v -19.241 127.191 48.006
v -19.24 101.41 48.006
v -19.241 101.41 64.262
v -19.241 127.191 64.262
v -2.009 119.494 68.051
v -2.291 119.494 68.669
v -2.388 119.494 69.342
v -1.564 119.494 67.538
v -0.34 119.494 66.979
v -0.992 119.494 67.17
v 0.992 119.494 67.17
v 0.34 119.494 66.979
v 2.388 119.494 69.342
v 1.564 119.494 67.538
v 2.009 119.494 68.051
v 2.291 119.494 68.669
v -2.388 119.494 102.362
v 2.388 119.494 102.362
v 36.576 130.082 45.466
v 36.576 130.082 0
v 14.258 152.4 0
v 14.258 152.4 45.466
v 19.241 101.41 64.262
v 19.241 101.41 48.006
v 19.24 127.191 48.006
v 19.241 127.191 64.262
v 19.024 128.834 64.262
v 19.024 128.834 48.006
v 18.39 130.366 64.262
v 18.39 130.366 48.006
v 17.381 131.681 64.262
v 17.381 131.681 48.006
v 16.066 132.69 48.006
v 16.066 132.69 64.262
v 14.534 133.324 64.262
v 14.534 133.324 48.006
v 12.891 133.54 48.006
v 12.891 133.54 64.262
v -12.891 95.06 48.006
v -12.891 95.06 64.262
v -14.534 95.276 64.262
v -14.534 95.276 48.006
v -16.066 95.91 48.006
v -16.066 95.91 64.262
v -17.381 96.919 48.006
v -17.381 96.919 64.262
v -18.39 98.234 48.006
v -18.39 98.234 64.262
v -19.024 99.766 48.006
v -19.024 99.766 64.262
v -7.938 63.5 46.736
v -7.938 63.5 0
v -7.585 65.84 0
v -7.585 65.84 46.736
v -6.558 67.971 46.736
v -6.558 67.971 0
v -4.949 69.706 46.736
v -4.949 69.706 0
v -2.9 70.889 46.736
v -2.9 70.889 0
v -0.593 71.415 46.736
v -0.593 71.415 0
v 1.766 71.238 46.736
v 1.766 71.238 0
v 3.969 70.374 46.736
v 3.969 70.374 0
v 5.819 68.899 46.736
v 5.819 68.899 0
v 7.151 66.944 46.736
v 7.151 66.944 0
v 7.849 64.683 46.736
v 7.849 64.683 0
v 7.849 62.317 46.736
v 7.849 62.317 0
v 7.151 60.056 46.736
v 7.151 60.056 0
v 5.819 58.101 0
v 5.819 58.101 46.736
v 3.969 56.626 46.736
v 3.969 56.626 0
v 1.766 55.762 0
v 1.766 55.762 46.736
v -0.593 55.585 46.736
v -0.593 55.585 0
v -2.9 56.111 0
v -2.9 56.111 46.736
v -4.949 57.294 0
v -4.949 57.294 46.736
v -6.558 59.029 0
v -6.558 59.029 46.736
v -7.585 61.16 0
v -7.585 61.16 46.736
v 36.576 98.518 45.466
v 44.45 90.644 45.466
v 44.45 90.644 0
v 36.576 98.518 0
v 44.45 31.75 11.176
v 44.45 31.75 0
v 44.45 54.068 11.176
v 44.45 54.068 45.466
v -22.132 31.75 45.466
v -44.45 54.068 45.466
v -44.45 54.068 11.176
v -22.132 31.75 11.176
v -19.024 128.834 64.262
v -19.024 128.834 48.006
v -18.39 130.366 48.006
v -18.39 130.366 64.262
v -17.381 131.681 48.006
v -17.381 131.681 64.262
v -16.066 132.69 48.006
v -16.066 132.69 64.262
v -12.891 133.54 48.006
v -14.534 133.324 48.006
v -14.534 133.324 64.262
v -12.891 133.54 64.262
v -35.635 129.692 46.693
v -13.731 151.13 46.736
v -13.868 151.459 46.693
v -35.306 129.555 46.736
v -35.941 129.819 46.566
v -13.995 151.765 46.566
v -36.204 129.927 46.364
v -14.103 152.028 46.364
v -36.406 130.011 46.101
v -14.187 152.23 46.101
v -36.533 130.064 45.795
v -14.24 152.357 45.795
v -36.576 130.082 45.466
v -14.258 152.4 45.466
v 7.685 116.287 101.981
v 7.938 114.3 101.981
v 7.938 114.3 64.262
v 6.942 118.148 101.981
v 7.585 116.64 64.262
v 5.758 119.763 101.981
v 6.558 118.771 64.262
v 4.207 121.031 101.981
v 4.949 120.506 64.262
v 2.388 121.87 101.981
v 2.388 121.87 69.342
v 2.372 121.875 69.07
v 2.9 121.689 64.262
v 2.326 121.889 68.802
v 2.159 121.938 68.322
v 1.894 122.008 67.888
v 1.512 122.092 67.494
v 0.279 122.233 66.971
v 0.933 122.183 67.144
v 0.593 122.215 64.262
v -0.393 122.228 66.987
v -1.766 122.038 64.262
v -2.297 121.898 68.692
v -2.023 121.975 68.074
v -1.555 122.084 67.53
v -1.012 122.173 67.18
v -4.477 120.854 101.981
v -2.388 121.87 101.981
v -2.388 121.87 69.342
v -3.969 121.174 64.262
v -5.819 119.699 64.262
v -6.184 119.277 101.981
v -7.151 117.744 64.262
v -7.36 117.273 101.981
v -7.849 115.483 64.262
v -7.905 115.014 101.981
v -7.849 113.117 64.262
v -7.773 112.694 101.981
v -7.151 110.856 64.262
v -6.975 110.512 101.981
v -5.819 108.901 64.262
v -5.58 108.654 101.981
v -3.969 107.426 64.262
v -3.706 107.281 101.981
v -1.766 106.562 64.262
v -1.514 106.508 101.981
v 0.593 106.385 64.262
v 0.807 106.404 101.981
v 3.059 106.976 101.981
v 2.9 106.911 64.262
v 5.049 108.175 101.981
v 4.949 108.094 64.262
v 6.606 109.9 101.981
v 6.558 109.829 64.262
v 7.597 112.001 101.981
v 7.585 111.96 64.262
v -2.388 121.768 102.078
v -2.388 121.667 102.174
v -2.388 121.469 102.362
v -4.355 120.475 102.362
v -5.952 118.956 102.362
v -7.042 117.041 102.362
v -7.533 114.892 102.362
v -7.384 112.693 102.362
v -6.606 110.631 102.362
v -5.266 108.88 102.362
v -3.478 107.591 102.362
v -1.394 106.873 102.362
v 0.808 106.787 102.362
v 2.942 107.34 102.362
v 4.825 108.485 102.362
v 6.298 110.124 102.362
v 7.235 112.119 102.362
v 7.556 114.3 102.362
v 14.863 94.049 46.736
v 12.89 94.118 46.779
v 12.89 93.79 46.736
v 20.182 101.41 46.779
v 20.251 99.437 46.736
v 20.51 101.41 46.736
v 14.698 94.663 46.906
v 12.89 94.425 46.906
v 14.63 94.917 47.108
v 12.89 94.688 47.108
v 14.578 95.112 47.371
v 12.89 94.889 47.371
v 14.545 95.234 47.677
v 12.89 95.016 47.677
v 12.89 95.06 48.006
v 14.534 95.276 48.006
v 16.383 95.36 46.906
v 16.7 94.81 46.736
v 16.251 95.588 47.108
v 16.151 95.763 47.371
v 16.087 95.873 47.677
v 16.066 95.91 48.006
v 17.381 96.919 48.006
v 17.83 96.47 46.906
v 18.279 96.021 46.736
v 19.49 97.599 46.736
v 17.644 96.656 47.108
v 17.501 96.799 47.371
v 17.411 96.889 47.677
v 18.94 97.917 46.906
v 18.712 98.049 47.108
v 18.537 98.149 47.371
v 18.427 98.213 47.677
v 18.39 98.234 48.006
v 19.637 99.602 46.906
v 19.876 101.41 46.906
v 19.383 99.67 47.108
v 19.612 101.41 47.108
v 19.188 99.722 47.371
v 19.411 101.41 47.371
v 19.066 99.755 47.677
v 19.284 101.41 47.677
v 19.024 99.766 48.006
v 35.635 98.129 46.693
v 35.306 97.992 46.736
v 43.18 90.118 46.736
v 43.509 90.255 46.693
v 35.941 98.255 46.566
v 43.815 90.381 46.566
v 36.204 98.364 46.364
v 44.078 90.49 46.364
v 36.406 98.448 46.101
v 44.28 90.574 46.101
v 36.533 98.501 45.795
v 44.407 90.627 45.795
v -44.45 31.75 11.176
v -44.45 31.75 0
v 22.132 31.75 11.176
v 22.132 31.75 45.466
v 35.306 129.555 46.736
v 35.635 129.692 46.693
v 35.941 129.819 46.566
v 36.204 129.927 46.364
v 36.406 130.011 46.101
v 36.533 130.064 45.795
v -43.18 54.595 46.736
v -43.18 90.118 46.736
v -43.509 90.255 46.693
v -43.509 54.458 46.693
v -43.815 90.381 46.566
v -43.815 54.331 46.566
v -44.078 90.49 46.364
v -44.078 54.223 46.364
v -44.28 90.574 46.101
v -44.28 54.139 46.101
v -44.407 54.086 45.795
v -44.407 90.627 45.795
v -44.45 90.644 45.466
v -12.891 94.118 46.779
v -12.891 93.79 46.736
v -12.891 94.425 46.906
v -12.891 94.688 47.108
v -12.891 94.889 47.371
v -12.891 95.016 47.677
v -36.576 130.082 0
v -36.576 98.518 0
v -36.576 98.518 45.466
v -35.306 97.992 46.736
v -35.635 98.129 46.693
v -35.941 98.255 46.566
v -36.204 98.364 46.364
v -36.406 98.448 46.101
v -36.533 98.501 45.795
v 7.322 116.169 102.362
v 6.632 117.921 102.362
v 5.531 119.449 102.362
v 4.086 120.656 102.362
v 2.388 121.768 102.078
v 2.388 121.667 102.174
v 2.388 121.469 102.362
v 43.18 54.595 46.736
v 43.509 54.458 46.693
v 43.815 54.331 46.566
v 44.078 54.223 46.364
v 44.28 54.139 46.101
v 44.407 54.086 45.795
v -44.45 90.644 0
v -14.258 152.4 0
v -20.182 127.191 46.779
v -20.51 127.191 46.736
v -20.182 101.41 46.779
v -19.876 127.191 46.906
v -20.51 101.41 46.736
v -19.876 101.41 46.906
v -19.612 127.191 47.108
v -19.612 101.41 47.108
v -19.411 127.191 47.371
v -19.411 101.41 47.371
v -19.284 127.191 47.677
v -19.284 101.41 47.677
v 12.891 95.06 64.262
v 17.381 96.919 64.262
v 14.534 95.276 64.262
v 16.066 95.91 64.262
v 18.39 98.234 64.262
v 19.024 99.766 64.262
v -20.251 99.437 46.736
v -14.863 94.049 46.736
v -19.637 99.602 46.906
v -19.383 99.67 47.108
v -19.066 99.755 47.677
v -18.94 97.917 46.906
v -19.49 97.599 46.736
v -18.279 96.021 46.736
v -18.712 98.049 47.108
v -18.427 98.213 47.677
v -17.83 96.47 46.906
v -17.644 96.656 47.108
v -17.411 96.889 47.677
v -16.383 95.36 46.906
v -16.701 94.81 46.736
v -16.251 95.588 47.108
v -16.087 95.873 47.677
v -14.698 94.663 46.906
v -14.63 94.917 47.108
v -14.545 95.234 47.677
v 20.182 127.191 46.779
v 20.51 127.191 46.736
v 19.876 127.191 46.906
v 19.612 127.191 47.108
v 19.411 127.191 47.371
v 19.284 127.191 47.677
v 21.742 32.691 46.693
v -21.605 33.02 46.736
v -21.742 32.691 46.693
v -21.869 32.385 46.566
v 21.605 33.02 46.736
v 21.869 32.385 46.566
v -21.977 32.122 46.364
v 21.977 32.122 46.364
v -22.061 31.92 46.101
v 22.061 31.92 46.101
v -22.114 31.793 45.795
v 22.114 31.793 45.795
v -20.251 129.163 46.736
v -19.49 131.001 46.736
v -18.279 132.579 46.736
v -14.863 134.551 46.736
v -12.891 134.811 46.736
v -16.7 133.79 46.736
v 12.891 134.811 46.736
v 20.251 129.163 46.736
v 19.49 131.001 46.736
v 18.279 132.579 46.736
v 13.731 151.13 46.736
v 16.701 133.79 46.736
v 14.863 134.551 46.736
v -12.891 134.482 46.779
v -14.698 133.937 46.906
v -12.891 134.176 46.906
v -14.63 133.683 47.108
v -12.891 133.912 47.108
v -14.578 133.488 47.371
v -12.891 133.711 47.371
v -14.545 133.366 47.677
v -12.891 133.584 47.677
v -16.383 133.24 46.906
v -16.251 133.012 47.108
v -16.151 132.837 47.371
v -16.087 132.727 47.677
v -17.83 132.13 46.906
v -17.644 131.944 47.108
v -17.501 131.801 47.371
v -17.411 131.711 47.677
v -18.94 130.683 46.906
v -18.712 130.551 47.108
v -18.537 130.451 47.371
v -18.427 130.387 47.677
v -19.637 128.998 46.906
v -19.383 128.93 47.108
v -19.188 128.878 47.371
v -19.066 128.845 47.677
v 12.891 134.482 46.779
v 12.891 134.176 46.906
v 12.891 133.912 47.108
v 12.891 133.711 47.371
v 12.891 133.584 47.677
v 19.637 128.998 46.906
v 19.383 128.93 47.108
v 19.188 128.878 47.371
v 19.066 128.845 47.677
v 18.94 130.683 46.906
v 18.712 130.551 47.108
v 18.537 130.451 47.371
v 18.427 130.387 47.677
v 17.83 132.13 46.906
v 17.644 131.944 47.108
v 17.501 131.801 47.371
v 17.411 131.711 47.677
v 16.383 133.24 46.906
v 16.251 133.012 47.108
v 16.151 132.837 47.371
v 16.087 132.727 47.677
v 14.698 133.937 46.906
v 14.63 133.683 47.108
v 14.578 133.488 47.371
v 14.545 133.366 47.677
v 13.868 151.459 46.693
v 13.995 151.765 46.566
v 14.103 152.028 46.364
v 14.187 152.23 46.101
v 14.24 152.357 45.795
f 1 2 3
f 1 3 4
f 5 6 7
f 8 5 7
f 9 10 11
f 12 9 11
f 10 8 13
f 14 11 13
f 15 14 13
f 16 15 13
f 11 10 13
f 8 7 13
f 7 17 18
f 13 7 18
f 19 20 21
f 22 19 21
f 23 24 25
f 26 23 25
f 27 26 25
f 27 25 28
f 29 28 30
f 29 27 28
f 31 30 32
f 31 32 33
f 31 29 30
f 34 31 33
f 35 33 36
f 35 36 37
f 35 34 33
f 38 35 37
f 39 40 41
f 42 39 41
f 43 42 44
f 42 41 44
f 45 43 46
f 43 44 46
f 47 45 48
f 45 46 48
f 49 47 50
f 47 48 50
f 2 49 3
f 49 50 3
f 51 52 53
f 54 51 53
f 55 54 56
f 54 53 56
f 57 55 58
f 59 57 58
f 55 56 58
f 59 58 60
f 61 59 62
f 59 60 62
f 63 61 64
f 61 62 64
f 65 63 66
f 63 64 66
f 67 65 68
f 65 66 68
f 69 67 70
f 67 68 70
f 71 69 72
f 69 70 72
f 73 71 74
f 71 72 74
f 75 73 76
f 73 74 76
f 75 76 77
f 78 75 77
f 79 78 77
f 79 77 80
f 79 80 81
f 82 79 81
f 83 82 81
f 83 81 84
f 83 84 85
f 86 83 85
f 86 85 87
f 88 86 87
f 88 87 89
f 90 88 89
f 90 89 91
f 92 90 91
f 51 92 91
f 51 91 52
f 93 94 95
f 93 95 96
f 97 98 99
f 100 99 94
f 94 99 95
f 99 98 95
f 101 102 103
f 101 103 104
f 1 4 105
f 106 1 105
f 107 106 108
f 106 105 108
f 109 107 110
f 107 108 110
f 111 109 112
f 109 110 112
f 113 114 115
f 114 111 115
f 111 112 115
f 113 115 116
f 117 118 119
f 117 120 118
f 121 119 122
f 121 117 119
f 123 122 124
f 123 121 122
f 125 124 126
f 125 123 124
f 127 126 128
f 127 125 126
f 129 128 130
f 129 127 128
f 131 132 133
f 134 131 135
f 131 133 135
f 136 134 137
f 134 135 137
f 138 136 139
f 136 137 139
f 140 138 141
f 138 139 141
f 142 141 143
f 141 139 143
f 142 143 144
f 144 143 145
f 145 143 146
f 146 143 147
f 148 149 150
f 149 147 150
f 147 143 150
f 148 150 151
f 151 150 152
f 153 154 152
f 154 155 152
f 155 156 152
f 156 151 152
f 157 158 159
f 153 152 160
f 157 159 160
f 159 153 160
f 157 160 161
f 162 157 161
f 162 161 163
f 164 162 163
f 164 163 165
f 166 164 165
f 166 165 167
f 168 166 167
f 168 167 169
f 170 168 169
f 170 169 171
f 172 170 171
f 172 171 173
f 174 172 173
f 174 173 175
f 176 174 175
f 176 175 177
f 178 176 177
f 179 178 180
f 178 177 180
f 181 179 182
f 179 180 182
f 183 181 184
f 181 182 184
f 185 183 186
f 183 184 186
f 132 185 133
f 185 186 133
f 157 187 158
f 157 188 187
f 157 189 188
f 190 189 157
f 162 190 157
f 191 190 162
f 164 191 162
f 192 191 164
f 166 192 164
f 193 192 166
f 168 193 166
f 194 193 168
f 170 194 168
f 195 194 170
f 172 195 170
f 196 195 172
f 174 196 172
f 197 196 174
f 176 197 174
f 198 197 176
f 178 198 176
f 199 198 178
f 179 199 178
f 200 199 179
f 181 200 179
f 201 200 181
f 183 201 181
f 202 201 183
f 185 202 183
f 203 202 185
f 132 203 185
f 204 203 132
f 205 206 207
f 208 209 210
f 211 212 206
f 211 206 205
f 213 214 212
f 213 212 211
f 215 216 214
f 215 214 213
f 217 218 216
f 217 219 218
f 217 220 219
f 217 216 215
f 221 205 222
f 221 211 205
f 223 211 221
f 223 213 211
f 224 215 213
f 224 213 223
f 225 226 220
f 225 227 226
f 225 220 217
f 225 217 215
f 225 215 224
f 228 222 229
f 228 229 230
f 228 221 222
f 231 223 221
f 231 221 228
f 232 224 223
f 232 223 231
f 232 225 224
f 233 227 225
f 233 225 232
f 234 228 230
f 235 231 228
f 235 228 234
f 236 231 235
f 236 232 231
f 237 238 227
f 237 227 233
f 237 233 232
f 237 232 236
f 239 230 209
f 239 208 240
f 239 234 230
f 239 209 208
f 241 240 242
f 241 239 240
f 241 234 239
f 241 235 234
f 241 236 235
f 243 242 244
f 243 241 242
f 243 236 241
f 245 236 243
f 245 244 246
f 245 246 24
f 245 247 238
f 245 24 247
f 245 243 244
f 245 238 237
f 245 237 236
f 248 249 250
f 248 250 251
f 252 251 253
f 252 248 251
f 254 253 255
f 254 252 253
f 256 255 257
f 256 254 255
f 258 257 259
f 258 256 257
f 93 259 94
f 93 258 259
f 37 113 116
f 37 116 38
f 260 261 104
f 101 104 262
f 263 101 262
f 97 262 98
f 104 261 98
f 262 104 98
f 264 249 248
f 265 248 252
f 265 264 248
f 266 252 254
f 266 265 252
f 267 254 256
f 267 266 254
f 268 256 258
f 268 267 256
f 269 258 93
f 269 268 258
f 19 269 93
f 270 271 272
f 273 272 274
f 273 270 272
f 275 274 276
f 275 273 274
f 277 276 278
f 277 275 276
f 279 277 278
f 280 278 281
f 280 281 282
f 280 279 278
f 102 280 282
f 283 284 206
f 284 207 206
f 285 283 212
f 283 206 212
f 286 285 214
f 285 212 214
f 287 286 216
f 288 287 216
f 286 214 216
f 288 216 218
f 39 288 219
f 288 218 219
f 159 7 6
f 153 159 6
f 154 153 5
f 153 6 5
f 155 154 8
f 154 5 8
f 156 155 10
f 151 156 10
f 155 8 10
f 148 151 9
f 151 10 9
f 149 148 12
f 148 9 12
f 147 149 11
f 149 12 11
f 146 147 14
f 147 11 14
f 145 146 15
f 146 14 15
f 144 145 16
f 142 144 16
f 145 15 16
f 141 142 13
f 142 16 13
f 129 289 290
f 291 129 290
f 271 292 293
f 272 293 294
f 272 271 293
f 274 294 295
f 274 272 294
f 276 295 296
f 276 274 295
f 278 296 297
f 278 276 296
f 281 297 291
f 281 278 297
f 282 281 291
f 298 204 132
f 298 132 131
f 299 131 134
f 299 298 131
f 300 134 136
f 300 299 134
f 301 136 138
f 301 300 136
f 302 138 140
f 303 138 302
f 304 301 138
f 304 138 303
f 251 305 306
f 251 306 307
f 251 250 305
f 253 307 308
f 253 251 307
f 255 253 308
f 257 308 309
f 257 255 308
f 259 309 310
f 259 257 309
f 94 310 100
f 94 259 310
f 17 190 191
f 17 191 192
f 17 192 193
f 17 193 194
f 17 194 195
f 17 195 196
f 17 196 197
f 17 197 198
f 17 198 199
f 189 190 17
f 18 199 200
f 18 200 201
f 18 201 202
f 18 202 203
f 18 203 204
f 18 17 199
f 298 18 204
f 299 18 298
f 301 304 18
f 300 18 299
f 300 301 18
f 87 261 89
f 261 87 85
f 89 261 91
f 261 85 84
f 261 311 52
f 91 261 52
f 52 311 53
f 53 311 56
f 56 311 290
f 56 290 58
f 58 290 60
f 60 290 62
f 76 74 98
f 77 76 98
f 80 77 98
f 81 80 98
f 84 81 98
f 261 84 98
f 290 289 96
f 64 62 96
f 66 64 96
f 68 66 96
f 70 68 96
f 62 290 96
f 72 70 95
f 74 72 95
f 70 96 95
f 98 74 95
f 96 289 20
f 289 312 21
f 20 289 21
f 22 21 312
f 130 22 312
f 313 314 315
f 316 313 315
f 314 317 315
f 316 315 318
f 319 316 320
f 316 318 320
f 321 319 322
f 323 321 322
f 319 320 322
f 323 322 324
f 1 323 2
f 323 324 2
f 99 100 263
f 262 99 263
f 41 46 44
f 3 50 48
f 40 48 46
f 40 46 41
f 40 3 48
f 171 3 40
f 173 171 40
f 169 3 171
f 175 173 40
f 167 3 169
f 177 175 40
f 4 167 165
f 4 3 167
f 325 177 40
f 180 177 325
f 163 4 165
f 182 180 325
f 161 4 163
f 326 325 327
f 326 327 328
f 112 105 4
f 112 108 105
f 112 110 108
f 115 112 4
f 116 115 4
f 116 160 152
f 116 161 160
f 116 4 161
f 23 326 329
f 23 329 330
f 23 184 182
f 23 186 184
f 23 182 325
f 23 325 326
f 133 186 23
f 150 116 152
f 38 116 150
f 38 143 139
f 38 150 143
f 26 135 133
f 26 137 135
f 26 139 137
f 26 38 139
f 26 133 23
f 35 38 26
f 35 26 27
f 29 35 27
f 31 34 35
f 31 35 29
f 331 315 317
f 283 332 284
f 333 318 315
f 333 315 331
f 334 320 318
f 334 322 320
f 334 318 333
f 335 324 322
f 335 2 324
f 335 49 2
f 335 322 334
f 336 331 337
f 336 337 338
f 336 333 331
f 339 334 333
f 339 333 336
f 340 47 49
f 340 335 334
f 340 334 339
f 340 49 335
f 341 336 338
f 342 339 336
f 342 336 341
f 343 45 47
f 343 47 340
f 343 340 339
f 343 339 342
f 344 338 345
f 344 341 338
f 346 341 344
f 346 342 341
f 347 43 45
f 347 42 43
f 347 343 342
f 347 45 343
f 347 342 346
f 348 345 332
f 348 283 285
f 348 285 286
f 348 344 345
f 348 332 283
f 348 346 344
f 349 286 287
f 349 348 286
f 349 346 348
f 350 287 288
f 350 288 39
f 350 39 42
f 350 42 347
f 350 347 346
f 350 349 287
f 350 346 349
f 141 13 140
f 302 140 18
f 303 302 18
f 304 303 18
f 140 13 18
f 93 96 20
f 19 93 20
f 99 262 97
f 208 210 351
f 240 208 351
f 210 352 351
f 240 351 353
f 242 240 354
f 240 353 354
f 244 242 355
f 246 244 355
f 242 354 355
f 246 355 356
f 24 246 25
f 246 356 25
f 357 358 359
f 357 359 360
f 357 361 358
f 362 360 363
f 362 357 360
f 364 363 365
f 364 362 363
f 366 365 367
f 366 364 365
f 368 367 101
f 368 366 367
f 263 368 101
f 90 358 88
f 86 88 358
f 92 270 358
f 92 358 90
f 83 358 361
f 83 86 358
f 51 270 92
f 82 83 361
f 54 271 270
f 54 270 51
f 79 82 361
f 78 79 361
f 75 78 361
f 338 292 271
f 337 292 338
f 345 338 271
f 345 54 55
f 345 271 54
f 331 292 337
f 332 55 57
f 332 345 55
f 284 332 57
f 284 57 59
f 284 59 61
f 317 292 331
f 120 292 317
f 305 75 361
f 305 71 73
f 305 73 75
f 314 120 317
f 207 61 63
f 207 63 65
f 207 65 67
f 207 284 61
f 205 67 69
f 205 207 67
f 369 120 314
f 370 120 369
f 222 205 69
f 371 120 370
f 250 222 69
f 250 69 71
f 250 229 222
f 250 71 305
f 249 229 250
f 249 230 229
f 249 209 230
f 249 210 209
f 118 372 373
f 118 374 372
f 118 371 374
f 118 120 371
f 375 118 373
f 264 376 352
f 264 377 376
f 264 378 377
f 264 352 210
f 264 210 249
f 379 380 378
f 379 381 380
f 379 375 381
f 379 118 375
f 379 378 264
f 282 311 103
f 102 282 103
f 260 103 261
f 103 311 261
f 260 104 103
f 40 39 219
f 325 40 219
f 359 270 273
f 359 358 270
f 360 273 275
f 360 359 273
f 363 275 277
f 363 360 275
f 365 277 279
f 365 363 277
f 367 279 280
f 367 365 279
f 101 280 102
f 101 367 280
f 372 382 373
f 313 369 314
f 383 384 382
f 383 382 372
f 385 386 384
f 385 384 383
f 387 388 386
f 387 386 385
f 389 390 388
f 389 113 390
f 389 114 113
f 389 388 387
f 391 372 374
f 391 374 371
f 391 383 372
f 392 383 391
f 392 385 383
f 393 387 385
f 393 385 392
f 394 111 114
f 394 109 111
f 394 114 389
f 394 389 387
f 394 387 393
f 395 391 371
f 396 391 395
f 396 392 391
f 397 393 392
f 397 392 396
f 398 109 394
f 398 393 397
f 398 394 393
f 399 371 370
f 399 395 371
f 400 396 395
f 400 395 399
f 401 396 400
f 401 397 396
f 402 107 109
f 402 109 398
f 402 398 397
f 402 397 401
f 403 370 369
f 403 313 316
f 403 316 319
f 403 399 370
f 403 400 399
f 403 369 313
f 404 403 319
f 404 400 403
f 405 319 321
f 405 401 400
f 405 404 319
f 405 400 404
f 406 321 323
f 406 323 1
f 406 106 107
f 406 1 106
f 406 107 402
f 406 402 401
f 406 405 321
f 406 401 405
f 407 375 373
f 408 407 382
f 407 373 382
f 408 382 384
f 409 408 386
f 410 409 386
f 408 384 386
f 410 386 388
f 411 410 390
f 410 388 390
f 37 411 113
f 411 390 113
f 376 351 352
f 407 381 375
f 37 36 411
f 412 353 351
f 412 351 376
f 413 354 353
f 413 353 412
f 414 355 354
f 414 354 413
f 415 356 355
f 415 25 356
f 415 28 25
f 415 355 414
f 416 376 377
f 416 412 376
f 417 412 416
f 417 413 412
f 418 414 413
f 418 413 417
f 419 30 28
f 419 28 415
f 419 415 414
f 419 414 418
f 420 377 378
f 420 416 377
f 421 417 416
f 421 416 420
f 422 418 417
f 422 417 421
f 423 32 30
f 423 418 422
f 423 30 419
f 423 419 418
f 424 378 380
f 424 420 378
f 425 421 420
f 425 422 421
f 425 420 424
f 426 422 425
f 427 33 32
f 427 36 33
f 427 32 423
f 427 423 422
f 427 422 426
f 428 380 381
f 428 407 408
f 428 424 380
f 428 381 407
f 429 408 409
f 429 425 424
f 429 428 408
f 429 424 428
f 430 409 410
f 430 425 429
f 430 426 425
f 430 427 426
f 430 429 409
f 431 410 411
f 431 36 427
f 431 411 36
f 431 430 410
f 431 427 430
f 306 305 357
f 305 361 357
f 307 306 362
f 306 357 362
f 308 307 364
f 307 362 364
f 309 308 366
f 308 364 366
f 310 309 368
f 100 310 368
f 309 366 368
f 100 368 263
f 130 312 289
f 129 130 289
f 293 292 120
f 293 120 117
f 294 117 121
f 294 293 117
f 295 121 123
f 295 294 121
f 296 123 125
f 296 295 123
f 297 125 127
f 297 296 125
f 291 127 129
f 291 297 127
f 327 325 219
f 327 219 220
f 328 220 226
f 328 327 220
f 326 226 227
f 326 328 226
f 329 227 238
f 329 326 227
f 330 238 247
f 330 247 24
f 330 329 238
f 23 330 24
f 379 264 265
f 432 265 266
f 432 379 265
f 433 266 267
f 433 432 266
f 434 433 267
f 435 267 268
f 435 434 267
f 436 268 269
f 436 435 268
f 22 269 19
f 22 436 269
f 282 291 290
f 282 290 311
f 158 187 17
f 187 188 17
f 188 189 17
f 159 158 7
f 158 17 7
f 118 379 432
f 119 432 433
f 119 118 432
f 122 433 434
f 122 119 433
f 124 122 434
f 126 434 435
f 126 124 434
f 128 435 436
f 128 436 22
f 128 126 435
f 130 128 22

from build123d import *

# Parameters (mm, degrees)
BOSS_EXTRUDE1_DEPTH = 46.736
SKETCH3_W           = 38.481
SKETCH3_H           = 38.481
BOSS_EXTRUDE2_DEPTH = 17.526
SKETCH_D_R          = 7.9375
BOSS_EXTRUDE3_DEPTH = 38.1
CUT_EXTRUDE1_DEPTH  = 35.56
FILLET1_R           = 6.35
FILLET2_R           = 1.27
KEYWAY_START        = 5.1943
KEYWAY_DEPTH        = 33.9057
CHAMFER1_SIZE       = 0.381
SKETCH7_R           = 7.9375
CUT_EXTRUDE3_DEPTH  = 103.362


with BuildPart() as part:
    # L,M → Boss-Extrude1 (new body)
    with BuildSketch(Plane.XY):
        Polygon((-44.45, 31.75), (44.45, 31.75), (44.45, 90.644463274), (36.576, 98.518463274), (36.576, 130.081536726), (14.257536726, 152.4), (-14.257536726, 152.4), (-36.576, 130.081536726), (-36.576, 98.518463274), (-44.45, 90.644463274), align=None)
    extrude(amount=BOSS_EXTRUDE1_DEPTH)

    # Sketch3 → Boss-Extrude2 (add)
    with BuildSketch(Plane.XY.offset(46.736)):
        with Locations((0, 114.3)):
            Rectangle(SKETCH3_W, SKETCH3_H)
    extrude(amount=BOSS_EXTRUDE2_DEPTH)

    # D → Boss-Extrude3 (add)
    with BuildSketch(Plane.XY.offset(64.262)):
        with Locations((0, 114.3)):
            Circle(SKETCH_D_R)
    extrude(amount=BOSS_EXTRUDE3_DEPTH)

    # Sketch5 → Cut-Extrude1 (cut)
    with BuildSketch(Plane.XY.offset(46.736)):
        Polygon((44.45, 54.068463274), (22.131536726, 31.75), (44.45, 31.75), align=None)
        Polygon((-44.45, 31.75), (-44.45, 54.068463274), (-22.131536726, 31.75), align=None)
    extrude(amount=-CUT_EXTRUDE1_DEPTH, mode=Mode.SUBTRACT)

    # Fillet1
    fillet1_edges = [part.edges().sort_by_distance(p)[0] for p in [
        (-19.2405, 133.5405, 55.499),
        (-19.2405, 95.0595, 55.499),
        (19.2405, 95.0595, 55.499),
        (19.2405, 133.5405, 55.499),
    ]]
    fillet(fillet1_edges, radius=FILLET1_R)

    # Fillet2
    fillet2_edges = [part.edges().sort_by_distance(p)[0] for p in [
        (44.45, 72.356463274, 46.736),
        (33.290768363, 42.909231637, 46.736),
        (40.513, 94.581463274, 46.736),
        (36.576, 114.3, 46.736),
        (25.416768363, 141.240768363, 46.736),
        (0, 31.75, 46.736),
        (0, 152.4, 46.736),
        (-25.416768363, 141.240768363, 46.736),
        (-36.576, 114.3, 46.736),
        (-40.513, 94.581463274, 46.736),
        (-44.45, 72.356463274, 46.736),
        (-33.290768363, 42.909231637, 46.736),
        (0, 95.0595, 46.736),
        (-19.2405, 114.3, 46.736),
        (19.2405, 114.3, 46.736),
        (0, 133.5405, 46.736),
        (-17.380628061, 96.919371939, 46.736),
        (17.380628061, 96.919371939, 46.736),
        (-17.380628061, 131.680628061, 46.736),
        (17.380628061, 131.680628061, 46.736),
    ]]
    fillet(fillet2_edges, radius=FILLET2_R)

    # Sketch6 → Keyway (cut, through all)
    with BuildSketch(Plane(origin=(0, 114.3, 0), x_dir=(-1, 0, 0), z_dir=(0, 1, 0)).offset(KEYWAY_START)):
        with BuildLine():
            Line((2.3876, 102.362), (2.3876, 69.342))
            ThreePointArc((2.3876, 69.342), (0, 66.9544), (-2.3876, 69.342))
            Line((-2.3876, 69.342), (-2.3876, 102.362))
            ThreePointArc((-2.3876, 102.362), (0, 104.7496), (2.3876, 102.362))
        make_face()
    extrude(amount=KEYWAY_DEPTH, mode=Mode.SUBTRACT)

    # Chamfer1
    chamfer1_edges = [part.edges().sort_by_distance(p)[0] for p in [
        (-4.693204196, 107.898614164, 102.362),
    ]]
    chamfer(chamfer1_edges, length=CHAMFER1_SIZE)

    # Sketch7 → Cut-Extrude3 (cut, through all)
    with BuildSketch(Plane(origin=(0, 0, 0), x_dir=(-1, 0, 0), z_dir=(0, 0, -1))):
        with Locations((0, 63.5)):
            Circle(SKETCH7_R)
    extrude(amount=-CUT_EXTRUDE3_DEPTH, mode=Mode.SUBTRACT)


solid = part.part
